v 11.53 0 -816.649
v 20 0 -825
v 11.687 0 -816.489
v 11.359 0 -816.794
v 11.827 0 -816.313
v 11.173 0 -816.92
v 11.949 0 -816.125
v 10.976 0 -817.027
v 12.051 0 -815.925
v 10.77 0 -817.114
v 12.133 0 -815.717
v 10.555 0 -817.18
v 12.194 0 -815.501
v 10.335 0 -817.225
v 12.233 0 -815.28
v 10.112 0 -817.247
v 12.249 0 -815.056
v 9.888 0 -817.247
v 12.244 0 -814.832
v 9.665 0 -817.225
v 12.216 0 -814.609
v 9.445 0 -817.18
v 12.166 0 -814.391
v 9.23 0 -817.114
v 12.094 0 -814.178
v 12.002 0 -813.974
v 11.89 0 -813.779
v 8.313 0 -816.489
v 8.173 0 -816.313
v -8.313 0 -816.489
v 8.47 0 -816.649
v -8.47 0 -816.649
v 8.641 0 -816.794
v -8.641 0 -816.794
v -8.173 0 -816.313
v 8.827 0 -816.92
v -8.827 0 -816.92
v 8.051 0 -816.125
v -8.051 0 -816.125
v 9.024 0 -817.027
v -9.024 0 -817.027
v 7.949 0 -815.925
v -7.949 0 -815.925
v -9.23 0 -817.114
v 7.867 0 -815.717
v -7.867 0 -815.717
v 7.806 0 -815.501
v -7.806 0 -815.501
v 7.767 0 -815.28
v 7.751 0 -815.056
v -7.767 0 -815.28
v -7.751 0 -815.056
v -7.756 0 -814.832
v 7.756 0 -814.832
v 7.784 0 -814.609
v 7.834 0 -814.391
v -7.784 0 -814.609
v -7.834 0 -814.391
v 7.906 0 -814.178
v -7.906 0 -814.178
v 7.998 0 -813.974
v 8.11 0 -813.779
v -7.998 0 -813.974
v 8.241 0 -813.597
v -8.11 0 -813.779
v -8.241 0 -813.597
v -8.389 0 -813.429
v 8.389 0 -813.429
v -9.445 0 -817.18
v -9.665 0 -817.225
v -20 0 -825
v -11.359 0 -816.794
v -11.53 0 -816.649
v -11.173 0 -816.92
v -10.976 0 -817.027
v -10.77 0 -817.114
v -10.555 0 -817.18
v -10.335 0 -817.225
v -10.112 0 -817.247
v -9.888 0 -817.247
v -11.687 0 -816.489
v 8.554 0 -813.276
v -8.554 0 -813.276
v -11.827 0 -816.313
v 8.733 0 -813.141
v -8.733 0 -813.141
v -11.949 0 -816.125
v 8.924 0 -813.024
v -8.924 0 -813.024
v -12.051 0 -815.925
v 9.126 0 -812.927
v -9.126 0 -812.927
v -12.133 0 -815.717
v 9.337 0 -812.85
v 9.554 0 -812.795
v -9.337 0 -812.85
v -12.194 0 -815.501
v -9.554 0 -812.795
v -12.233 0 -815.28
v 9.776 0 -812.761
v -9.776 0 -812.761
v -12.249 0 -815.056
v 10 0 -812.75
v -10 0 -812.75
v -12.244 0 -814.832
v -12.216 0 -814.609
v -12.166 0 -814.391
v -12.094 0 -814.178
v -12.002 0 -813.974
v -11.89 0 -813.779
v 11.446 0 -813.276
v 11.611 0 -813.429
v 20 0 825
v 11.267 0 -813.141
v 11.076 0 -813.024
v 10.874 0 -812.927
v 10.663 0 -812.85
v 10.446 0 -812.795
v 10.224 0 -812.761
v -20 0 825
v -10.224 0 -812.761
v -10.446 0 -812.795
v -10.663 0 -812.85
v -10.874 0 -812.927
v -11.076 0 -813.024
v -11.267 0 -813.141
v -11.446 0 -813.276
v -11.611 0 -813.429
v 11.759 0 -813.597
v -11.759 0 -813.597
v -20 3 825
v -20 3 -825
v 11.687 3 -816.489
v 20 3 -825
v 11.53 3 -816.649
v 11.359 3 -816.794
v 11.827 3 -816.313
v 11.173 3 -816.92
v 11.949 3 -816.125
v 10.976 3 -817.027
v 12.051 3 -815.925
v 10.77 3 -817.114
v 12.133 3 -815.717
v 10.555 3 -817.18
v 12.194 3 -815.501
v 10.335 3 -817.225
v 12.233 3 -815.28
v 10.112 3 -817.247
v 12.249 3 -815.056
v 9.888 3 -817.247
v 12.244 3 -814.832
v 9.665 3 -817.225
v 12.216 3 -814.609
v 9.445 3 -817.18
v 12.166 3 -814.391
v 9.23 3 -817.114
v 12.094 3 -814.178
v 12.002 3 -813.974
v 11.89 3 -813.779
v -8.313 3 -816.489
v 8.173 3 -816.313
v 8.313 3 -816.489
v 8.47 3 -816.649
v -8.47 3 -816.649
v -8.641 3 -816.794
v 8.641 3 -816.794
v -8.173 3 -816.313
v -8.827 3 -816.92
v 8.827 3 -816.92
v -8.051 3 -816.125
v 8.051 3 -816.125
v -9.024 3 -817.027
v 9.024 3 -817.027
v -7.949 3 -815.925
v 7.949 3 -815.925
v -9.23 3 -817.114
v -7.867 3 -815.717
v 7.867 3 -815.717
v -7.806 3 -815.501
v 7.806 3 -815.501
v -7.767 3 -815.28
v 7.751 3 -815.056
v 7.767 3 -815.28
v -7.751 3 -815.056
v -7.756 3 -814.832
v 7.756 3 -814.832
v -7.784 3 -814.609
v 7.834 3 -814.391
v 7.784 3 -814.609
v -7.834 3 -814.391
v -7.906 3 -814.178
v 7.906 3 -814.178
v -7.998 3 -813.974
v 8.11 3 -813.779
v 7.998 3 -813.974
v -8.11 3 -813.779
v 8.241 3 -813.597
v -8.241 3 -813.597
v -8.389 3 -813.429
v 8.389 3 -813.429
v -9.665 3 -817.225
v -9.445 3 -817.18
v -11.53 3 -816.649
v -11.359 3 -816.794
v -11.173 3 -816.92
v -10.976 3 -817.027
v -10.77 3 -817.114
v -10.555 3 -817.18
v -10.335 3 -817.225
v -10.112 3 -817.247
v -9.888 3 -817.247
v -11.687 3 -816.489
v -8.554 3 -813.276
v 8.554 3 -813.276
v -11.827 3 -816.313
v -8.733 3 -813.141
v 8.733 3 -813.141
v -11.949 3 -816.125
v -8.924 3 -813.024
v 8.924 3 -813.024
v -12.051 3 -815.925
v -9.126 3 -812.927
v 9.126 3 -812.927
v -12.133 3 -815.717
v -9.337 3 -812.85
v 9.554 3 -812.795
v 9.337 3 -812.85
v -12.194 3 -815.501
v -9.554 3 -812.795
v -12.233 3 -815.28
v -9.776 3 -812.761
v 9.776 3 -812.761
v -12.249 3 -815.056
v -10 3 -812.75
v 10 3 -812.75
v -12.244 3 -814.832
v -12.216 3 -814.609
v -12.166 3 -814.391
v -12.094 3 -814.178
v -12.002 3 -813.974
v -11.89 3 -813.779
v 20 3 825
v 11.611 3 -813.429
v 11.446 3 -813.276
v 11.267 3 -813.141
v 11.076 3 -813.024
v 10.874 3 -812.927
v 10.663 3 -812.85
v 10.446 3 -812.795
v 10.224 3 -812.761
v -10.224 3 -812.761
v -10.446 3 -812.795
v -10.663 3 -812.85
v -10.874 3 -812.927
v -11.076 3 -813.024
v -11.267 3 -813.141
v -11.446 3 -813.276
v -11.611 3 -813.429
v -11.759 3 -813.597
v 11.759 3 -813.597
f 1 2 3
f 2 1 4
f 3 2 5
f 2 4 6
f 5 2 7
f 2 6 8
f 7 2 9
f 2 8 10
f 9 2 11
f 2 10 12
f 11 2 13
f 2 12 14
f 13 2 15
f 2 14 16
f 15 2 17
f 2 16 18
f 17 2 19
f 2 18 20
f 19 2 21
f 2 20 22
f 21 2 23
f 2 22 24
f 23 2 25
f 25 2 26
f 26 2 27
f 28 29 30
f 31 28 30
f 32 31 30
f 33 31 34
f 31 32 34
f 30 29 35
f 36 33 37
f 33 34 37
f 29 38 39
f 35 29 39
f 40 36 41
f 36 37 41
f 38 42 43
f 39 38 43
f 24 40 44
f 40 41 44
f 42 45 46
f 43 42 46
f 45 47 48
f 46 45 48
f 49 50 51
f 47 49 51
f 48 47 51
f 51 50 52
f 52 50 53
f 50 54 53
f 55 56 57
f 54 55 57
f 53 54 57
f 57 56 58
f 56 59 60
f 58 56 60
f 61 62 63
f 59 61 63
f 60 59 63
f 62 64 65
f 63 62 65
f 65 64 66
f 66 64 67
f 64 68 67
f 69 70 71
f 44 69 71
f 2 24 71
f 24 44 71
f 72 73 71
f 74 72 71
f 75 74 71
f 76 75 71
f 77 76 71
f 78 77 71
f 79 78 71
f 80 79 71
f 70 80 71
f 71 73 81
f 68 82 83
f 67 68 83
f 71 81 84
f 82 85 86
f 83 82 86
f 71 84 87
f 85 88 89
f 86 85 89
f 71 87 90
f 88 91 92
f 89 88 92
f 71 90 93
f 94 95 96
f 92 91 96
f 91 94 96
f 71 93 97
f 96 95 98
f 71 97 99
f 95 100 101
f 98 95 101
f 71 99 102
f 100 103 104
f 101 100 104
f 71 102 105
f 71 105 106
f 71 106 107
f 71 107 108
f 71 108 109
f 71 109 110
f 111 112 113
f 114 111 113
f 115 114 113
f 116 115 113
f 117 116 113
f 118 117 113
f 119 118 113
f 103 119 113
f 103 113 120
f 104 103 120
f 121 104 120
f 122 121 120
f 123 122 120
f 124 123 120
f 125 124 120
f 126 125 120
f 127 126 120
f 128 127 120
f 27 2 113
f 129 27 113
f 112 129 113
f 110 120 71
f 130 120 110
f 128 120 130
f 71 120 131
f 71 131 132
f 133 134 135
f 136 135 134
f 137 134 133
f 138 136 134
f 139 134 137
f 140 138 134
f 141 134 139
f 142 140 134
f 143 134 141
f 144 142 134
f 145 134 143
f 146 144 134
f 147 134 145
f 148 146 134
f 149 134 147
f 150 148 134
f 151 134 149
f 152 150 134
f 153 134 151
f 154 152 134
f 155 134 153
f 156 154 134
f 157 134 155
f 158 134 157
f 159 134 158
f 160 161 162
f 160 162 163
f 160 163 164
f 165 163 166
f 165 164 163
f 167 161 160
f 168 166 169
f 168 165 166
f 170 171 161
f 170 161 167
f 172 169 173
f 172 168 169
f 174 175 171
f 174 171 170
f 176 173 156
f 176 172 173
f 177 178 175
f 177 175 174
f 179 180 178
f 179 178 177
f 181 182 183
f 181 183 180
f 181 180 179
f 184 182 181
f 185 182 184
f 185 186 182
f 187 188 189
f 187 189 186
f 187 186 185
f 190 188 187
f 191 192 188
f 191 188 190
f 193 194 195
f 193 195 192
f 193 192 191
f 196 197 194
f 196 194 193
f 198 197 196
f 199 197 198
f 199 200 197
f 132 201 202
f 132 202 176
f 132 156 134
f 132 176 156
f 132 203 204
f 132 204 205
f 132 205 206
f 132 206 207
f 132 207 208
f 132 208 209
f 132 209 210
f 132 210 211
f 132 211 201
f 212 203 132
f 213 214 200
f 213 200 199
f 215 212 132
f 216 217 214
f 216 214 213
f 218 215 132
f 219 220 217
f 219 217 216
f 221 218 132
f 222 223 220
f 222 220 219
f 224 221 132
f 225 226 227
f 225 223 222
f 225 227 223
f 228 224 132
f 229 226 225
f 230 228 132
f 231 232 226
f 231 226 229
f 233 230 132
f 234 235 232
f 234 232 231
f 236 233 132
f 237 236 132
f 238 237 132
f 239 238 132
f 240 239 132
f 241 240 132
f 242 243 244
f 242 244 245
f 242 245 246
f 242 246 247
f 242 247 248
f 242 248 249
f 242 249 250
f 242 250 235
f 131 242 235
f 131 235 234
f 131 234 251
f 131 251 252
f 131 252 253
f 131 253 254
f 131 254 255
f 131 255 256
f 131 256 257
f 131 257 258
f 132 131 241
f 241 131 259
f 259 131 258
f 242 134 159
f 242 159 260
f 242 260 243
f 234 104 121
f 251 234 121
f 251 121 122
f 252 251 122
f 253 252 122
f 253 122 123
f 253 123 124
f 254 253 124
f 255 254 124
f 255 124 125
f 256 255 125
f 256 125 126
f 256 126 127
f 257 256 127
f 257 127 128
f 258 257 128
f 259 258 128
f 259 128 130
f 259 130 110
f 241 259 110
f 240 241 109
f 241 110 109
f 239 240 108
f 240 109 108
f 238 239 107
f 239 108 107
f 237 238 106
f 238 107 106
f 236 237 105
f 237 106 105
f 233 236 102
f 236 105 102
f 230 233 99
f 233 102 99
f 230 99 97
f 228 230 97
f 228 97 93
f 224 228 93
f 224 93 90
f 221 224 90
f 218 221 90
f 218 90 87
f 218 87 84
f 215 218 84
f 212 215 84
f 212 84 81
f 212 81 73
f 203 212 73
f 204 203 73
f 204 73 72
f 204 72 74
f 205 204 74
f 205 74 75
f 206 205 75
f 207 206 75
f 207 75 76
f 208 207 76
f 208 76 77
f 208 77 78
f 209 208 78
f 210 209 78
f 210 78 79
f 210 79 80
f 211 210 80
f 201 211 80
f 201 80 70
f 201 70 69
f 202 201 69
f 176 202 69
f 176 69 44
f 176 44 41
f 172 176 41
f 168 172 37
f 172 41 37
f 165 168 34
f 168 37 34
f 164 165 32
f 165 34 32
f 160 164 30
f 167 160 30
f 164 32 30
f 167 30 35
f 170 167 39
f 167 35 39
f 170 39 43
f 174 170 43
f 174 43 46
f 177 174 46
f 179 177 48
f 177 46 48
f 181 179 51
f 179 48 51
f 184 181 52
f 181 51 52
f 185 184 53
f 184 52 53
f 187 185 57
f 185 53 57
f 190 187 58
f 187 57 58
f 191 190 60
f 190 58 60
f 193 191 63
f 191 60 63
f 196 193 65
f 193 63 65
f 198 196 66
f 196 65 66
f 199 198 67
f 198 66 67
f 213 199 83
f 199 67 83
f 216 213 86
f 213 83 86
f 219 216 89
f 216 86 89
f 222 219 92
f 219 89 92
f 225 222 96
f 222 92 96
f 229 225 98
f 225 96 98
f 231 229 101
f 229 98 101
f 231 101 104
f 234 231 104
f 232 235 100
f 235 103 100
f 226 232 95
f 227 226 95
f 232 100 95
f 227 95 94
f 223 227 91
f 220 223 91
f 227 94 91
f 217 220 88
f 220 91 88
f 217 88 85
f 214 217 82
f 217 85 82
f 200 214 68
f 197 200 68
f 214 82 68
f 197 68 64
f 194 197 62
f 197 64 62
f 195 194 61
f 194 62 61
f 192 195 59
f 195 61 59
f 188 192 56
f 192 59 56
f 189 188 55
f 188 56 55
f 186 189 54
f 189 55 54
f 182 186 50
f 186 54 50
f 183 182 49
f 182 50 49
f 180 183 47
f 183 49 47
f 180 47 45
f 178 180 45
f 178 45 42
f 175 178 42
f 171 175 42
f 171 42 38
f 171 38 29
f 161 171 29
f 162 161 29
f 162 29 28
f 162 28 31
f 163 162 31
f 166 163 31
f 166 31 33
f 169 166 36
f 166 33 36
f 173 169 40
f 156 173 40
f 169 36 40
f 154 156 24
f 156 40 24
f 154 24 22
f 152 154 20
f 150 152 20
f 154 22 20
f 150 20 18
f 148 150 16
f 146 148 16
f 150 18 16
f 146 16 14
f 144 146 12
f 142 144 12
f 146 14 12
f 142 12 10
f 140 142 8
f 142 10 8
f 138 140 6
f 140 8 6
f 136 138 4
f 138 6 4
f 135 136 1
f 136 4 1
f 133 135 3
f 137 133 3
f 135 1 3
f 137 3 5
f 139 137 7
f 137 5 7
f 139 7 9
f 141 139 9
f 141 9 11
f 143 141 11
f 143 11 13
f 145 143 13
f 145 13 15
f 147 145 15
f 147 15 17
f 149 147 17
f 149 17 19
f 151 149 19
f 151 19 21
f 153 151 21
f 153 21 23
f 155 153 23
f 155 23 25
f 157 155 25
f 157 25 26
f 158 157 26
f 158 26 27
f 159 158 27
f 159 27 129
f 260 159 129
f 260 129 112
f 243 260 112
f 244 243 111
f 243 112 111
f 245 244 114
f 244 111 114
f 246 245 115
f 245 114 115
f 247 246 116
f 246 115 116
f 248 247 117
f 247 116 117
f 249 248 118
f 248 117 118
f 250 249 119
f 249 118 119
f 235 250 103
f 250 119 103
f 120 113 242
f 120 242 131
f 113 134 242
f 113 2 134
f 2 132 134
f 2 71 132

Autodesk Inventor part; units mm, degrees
ref_plane "YZ Plane" through (0, 0, 0) normal (1, 0, 0) x (0, 1, 0)
ref_plane "XZ Plane" through (0, 0, 0) normal (0, 1, 0) x (-1, 0, 0)
ref_plane "XY Plane" through (0, 0, 0) normal (0, 0, 1) x (1, 0, 0)
sketch "Sketch1" plane through (0, 0, 0) normal (0, 1, 0) x (-1, 0, 0)
  line L0 (-20, 825) -> (20, 825)
  line L1 (20, 825) -> (20, -825)
  line L2 (20, -825) -> (-20, -825)
  line L3 (-20, -825) -> (-20, 825)
  line L4 (-20, 825) -> (20, -825) construction
  line L5 (20, 825) -> (-20, -825) construction
  point P0 (0, 0)
  dimension "d0" = 40
  dimension "d1" = 1650
extrude "Extrusion1" add sketch "Sketch1" along normal blind 3
sketch "Sketch2" plane through (0, 3, 0) normal (0, 1, 0) x (1, 0, 0)
  line L0 (20, 825) -> (-20, 825) projected
  line L1 (0, 825) -> (0, 815)
  line L2 (0, 815) -> (-10, 815)
  point P0 (0, 0)
  point P1 (10, 815)
  point P2 (10, 815)
  dimension "d4" = 10
  dimension "d5" = 10
hole "Hole1" at (-10, 3, -815) at (10, 3, -815) direction (0, -1, 0) diameter 4.5 depth 8 clearance for "Countersunk Flat Head Screw ISO 2009/7046" size "M4" standard "ISO"
properties part number "SP54V1 Acrilico inferior" material "Polycarbonate, Clear"
